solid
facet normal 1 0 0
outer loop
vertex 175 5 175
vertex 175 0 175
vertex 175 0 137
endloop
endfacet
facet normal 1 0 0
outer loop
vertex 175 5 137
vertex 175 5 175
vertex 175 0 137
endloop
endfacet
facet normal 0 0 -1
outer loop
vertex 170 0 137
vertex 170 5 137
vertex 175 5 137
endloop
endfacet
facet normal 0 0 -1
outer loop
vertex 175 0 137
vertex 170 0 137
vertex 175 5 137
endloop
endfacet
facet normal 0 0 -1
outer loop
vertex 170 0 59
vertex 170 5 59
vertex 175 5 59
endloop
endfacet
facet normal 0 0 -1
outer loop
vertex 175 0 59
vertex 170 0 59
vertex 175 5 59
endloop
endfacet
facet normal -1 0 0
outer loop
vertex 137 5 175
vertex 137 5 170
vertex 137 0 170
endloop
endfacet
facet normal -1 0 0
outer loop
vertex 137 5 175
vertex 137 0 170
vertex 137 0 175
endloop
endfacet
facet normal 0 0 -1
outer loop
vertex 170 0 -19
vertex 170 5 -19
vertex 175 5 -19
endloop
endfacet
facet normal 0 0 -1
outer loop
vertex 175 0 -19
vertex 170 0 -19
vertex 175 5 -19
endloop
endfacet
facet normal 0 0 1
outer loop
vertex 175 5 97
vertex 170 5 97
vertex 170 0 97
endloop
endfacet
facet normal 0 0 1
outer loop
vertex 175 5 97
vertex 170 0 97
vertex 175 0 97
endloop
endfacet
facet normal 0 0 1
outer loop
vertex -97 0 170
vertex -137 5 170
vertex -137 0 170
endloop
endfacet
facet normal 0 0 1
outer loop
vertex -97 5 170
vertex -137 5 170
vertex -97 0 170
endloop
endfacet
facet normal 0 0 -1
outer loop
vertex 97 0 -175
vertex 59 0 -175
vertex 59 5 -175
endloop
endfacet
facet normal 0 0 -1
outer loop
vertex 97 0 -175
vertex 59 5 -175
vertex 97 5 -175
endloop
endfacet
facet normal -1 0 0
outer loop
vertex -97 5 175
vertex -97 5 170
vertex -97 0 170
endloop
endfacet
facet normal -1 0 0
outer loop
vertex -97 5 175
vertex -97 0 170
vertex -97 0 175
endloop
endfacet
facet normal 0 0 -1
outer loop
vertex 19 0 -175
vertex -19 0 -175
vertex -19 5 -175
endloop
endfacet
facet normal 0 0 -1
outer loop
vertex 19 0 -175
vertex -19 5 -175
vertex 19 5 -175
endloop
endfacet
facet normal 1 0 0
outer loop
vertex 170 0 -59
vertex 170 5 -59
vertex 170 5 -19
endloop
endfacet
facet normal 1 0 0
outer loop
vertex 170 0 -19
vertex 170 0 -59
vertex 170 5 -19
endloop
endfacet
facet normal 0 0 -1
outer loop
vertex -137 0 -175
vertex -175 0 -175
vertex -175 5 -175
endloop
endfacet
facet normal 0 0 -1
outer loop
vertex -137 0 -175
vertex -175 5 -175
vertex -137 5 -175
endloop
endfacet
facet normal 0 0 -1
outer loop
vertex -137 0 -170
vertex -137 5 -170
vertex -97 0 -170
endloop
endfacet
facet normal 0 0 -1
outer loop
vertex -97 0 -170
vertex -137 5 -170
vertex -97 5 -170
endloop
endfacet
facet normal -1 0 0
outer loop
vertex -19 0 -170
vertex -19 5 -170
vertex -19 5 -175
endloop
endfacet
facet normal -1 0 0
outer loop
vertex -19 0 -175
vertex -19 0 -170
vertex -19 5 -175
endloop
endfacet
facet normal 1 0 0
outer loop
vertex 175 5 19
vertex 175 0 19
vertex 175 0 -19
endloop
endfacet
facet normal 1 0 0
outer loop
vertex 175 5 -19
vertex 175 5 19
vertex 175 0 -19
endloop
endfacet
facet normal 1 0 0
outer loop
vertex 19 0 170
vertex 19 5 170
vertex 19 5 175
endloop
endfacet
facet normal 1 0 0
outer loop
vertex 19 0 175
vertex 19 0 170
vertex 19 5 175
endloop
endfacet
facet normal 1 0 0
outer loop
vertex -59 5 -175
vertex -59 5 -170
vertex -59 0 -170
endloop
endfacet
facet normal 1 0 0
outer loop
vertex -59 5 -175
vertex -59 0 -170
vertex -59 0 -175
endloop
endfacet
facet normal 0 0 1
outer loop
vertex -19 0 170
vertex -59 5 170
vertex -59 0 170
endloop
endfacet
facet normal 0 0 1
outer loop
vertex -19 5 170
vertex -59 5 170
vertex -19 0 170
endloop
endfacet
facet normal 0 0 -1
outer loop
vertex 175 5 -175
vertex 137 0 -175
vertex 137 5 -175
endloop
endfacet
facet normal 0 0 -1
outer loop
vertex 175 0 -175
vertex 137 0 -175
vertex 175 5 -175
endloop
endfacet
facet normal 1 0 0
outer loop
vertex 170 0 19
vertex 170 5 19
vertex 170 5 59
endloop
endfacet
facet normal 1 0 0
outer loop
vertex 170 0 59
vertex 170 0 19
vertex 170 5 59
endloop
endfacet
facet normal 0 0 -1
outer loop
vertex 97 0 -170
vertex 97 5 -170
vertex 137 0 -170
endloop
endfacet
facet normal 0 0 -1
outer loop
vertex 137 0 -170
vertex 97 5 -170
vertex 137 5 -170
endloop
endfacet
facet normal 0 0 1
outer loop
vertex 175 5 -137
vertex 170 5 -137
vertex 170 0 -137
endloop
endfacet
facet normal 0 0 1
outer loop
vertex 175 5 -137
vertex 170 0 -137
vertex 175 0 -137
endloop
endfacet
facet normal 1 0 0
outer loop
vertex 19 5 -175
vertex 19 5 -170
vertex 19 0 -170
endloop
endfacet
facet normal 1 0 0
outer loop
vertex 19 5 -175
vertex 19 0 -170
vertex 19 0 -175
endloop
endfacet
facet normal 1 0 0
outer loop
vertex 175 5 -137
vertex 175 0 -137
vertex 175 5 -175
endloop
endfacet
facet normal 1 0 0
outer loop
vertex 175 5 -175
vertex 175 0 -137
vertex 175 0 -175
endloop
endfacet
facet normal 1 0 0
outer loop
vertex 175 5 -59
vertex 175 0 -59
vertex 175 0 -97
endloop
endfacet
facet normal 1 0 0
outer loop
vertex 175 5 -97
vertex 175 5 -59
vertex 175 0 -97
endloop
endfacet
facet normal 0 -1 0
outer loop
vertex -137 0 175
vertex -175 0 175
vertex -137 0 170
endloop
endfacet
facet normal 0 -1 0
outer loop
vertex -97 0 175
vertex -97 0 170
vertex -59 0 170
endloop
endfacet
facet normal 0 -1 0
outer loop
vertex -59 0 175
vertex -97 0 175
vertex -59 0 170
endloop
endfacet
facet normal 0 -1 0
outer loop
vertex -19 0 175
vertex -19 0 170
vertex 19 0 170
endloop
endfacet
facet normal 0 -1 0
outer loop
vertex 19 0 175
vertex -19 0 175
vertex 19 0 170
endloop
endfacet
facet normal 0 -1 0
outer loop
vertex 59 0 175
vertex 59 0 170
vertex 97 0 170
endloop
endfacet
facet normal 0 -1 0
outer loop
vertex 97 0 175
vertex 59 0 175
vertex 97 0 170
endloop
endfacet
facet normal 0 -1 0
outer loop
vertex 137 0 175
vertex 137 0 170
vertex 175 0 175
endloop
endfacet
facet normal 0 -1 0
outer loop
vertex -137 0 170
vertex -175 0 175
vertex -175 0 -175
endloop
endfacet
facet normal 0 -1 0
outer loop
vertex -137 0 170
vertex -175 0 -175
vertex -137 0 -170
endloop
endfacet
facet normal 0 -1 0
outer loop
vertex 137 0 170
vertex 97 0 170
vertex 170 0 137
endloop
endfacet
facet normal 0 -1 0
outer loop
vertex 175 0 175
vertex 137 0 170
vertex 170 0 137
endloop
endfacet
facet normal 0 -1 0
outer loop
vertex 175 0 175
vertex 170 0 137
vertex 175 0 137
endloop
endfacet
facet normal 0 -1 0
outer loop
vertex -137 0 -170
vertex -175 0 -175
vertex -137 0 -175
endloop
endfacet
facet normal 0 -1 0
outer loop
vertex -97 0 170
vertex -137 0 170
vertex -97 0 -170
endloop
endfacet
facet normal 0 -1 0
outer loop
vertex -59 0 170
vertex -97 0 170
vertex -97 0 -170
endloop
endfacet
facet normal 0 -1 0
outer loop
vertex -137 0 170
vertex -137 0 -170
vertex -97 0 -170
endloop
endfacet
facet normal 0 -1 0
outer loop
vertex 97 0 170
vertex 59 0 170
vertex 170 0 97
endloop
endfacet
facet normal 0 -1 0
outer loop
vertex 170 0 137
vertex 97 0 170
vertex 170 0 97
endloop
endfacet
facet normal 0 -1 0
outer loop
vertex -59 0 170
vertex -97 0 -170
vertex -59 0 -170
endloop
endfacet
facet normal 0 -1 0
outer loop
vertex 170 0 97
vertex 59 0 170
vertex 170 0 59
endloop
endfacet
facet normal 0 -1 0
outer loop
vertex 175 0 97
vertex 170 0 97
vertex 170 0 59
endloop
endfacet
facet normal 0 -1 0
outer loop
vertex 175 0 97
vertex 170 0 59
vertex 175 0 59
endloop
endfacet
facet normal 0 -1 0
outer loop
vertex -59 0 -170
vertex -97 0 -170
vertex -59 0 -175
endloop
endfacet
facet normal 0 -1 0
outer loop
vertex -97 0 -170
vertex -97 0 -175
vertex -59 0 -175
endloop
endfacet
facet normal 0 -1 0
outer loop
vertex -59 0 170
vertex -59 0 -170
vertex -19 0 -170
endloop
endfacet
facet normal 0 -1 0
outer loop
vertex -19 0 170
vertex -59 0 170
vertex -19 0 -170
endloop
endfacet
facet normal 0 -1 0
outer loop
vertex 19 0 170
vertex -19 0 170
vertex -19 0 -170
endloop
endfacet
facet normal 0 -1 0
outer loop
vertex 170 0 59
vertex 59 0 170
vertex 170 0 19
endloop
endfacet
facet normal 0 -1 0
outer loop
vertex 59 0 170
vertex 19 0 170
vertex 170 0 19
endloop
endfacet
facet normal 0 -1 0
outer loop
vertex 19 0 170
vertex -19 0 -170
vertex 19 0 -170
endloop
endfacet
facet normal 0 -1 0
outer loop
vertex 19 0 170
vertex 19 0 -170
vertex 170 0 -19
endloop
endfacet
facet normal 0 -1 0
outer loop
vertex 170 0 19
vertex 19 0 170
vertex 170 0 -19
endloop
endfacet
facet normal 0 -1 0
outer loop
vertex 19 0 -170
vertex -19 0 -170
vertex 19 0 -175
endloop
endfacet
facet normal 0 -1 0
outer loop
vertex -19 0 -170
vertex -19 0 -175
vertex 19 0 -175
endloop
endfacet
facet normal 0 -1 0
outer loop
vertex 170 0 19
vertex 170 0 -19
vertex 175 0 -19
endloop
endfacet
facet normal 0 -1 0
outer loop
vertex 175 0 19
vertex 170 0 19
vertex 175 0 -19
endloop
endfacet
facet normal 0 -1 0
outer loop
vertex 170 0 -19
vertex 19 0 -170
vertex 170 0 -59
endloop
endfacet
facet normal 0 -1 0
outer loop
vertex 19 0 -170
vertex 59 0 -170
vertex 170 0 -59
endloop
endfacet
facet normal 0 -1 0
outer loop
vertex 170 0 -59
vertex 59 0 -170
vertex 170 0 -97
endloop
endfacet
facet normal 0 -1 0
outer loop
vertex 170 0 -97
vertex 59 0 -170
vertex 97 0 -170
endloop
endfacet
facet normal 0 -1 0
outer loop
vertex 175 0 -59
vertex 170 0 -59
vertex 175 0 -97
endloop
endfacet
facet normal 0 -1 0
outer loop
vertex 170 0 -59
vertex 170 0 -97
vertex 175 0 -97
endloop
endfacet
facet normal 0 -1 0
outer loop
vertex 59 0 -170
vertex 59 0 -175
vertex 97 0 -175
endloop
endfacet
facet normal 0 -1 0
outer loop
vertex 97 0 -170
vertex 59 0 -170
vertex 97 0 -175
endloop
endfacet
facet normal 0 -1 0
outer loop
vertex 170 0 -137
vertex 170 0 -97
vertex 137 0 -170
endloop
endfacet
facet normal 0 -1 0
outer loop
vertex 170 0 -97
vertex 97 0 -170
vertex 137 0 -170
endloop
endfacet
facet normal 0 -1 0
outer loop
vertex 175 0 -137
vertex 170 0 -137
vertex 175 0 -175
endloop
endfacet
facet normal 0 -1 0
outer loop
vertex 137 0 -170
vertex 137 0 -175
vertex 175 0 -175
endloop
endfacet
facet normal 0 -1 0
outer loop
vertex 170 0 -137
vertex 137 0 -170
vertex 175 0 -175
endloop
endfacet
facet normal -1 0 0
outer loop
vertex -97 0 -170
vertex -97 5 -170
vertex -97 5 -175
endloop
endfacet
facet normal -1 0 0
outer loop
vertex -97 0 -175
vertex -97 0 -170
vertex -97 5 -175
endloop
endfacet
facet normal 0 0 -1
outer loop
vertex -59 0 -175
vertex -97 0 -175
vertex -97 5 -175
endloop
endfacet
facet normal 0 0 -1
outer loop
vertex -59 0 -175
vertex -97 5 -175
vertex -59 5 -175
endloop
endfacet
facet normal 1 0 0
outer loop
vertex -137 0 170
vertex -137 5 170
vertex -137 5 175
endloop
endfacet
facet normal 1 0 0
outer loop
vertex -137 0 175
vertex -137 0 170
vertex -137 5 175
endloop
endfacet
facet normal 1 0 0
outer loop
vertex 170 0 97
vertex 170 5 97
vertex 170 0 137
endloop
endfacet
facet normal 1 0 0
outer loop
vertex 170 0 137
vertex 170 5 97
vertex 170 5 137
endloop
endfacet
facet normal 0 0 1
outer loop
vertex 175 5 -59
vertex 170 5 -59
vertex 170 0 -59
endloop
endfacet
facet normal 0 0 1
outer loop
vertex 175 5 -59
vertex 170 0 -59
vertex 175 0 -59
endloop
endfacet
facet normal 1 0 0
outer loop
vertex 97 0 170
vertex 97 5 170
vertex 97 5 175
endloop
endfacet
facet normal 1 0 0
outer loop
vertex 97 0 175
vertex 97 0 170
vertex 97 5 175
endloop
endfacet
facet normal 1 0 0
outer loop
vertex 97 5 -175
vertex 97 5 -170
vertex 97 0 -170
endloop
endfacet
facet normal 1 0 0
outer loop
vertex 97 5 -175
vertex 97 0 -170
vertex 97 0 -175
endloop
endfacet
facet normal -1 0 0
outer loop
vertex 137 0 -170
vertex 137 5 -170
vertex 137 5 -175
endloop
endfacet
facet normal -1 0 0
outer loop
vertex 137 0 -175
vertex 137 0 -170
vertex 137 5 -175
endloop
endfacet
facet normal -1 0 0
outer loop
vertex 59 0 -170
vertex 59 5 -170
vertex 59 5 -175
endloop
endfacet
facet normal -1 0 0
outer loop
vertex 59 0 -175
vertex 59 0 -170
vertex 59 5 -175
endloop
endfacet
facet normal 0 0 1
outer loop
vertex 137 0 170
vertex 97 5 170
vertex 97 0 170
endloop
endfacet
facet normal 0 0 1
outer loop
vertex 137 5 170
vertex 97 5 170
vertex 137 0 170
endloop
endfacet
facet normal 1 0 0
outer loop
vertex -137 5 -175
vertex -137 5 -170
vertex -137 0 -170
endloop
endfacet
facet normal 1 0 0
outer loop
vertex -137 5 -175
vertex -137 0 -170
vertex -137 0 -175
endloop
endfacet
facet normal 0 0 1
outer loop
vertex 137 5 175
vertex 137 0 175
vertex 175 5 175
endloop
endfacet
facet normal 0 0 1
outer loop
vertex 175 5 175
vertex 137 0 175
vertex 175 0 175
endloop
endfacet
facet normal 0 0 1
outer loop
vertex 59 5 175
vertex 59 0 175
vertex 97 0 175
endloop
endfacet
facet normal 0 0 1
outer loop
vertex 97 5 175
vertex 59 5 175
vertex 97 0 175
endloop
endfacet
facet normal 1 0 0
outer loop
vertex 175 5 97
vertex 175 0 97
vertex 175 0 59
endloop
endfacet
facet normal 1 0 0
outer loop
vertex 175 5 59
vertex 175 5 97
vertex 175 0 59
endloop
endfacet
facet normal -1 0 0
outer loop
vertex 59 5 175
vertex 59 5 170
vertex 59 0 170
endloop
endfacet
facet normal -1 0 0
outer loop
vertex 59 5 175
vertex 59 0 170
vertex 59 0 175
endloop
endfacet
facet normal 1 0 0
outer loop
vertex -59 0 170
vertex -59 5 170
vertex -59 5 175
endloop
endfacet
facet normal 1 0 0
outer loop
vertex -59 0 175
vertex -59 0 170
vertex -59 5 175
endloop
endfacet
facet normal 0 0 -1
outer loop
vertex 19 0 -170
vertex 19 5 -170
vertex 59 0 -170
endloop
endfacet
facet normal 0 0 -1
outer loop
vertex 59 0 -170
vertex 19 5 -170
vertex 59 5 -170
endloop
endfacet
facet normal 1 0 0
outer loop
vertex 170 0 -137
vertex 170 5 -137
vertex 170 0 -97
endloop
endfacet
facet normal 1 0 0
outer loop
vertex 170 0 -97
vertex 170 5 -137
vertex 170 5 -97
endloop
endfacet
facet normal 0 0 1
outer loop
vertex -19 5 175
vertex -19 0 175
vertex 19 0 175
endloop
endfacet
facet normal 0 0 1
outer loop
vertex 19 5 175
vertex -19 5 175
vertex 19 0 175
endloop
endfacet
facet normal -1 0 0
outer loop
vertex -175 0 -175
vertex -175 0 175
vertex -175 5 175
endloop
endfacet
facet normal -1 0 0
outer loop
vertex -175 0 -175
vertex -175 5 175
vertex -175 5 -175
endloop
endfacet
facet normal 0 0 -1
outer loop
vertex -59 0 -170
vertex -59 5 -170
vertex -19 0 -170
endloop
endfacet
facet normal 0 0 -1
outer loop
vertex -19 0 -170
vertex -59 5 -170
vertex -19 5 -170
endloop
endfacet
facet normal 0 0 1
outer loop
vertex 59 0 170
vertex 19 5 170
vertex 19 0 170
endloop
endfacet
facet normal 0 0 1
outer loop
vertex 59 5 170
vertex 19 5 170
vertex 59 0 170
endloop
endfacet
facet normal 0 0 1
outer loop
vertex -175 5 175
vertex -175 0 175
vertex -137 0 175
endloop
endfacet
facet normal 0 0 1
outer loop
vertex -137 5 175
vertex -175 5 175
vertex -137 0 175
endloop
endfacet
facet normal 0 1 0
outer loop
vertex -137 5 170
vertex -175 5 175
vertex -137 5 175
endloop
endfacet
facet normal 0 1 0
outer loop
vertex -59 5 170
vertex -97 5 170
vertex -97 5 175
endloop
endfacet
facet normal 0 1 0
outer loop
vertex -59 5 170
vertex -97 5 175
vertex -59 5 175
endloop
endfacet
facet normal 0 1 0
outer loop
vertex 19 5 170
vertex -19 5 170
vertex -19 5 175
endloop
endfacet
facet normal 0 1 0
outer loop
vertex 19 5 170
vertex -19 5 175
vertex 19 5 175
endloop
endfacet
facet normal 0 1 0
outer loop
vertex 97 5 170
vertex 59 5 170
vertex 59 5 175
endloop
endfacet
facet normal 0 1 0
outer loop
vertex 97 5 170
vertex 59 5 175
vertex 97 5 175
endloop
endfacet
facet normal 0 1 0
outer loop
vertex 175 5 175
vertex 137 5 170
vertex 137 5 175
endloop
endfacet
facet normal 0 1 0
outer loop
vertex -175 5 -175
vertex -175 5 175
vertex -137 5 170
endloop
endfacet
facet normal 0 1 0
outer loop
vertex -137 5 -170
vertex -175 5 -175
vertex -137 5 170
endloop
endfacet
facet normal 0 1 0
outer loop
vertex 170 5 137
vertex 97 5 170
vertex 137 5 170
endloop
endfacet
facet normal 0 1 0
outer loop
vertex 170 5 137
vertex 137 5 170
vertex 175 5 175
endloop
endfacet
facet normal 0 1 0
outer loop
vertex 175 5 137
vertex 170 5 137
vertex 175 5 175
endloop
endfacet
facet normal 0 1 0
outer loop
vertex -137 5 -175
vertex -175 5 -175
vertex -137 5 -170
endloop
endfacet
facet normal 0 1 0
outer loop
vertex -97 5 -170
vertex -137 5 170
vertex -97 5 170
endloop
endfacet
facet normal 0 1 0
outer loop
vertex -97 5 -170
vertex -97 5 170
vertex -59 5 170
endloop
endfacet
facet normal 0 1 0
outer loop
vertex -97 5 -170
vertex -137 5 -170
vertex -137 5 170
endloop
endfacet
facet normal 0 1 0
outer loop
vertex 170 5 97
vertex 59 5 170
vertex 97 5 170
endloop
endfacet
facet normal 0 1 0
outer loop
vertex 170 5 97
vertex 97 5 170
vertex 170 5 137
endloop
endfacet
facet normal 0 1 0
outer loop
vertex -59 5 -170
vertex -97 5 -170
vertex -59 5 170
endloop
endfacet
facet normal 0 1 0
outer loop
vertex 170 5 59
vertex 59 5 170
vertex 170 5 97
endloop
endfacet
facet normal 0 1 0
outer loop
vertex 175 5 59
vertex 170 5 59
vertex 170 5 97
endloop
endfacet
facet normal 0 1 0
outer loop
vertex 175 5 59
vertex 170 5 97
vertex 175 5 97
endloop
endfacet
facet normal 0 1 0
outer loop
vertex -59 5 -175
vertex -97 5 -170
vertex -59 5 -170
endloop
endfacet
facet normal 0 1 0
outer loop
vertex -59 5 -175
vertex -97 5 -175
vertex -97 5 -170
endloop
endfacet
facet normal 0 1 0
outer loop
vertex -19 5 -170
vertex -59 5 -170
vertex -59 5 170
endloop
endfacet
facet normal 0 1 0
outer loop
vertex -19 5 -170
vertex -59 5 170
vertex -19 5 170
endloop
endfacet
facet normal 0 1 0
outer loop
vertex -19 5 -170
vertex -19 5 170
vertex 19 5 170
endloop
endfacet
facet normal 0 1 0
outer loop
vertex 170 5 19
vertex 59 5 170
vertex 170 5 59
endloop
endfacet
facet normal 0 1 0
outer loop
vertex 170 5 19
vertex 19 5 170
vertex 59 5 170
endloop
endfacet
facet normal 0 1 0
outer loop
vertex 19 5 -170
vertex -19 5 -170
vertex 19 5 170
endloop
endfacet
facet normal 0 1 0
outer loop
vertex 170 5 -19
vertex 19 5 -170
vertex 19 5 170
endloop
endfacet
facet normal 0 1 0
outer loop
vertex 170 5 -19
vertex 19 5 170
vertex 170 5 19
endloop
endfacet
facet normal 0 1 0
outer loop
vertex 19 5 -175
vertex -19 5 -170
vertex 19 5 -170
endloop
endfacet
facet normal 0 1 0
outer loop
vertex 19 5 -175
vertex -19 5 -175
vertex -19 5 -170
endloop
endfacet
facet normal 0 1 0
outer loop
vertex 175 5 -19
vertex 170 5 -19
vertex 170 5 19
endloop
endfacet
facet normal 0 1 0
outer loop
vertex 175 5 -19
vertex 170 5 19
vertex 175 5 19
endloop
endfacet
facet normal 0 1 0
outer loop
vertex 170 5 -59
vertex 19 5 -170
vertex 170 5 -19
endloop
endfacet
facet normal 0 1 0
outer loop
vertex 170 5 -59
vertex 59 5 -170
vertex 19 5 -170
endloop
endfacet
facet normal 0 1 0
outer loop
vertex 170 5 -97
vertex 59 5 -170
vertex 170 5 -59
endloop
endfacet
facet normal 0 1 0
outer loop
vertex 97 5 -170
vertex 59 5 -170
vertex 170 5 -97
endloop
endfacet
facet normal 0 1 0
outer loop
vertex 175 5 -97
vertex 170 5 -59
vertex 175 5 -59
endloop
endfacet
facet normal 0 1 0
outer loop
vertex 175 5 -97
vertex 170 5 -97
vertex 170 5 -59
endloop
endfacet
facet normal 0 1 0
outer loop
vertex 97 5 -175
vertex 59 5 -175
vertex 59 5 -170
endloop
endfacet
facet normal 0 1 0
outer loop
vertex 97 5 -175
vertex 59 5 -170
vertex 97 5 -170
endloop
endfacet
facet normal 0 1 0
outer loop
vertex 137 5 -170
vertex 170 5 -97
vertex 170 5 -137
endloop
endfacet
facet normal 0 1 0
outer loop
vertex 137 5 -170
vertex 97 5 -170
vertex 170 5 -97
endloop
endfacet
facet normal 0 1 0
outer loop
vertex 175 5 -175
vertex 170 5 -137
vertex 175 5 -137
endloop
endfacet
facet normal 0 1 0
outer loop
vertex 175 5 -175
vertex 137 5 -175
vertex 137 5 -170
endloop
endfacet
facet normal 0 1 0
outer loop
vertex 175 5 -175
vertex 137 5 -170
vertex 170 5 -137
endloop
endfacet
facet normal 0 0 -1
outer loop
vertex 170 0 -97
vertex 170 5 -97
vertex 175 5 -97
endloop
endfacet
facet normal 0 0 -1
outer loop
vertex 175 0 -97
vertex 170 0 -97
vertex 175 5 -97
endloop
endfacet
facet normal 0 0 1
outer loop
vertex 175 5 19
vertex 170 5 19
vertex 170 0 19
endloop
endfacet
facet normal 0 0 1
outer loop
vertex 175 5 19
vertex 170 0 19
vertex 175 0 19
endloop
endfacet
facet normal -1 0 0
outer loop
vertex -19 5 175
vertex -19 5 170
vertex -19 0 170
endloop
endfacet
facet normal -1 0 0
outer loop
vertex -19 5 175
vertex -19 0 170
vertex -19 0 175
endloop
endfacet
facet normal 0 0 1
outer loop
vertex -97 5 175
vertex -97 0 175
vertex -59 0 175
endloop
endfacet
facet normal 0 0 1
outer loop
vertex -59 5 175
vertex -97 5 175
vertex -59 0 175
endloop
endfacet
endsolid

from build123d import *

# Parameters (mm, degrees)
SKIZZE1_W                       = 350
SKIZZE1_H                       = 350
GRUNDPLATTE_DEPTH               = 5
SKIZZE2_W                       = 40
SKIZZE2_H                       = 5
SCHNITT_LINEAR_AUSTRAGEN1_DEPTH = 6
KREISMUSTER1_COUNT              = 2
KREISMUSTER1_ANGLE              = 90


with BuildPart() as part:
    # Skizze1 → Grundplatte (new body)
    with BuildSketch(Plane(origin=(0, 0, 0), x_dir=(1, 0, 0), z_dir=(0, 1, 0))):
        Rectangle(SKIZZE1_W, SKIZZE1_H)
    extrude(amount=GRUNDPLATTE_DEPTH)

    # Skizze2 → Schnitt-Linear austragen1 (cut, through all)
    with BuildSketch(Plane(origin=(0, 5, 0), x_dir=(1, 0, 0), z_dir=(0, 1, 0))):
        with Locations((-117, 172.5)):
            Rectangle(SKIZZE2_W, SKIZZE2_H)
        with Locations((-39, 172.5)):
            Rectangle(SKIZZE2_W, SKIZZE2_H)
        with Locations((39, 172.5)):
            Rectangle(SKIZZE2_W, SKIZZE2_H)
        with Locations((117, 172.5)):
            Rectangle(SKIZZE2_W, SKIZZE2_H)
    schnitt_linear_austragen1 = extrude(amount=-SCHNITT_LINEAR_AUSTRAGEN1_DEPTH, mode=Mode.SUBTRACT)

    # Spiegeln1: Schnitt-Linear austragen1 across plane
    add(schnitt_linear_austragen1.mirror(Plane.XY), mode=Mode.SUBTRACT)

    # Kreismuster1: Schnitt-Linear austragen1 ×2 about axis
    kreismuster1_axis = Axis((0, 0, 0), (0, -1, 0))
    for i in range(1, KREISMUSTER1_COUNT):
        add(schnitt_linear_austragen1.rotate(kreismuster1_axis, i * KREISMUSTER1_ANGLE / (KREISMUSTER1_COUNT - 1)), mode=Mode.SUBTRACT)


solid = part.part
